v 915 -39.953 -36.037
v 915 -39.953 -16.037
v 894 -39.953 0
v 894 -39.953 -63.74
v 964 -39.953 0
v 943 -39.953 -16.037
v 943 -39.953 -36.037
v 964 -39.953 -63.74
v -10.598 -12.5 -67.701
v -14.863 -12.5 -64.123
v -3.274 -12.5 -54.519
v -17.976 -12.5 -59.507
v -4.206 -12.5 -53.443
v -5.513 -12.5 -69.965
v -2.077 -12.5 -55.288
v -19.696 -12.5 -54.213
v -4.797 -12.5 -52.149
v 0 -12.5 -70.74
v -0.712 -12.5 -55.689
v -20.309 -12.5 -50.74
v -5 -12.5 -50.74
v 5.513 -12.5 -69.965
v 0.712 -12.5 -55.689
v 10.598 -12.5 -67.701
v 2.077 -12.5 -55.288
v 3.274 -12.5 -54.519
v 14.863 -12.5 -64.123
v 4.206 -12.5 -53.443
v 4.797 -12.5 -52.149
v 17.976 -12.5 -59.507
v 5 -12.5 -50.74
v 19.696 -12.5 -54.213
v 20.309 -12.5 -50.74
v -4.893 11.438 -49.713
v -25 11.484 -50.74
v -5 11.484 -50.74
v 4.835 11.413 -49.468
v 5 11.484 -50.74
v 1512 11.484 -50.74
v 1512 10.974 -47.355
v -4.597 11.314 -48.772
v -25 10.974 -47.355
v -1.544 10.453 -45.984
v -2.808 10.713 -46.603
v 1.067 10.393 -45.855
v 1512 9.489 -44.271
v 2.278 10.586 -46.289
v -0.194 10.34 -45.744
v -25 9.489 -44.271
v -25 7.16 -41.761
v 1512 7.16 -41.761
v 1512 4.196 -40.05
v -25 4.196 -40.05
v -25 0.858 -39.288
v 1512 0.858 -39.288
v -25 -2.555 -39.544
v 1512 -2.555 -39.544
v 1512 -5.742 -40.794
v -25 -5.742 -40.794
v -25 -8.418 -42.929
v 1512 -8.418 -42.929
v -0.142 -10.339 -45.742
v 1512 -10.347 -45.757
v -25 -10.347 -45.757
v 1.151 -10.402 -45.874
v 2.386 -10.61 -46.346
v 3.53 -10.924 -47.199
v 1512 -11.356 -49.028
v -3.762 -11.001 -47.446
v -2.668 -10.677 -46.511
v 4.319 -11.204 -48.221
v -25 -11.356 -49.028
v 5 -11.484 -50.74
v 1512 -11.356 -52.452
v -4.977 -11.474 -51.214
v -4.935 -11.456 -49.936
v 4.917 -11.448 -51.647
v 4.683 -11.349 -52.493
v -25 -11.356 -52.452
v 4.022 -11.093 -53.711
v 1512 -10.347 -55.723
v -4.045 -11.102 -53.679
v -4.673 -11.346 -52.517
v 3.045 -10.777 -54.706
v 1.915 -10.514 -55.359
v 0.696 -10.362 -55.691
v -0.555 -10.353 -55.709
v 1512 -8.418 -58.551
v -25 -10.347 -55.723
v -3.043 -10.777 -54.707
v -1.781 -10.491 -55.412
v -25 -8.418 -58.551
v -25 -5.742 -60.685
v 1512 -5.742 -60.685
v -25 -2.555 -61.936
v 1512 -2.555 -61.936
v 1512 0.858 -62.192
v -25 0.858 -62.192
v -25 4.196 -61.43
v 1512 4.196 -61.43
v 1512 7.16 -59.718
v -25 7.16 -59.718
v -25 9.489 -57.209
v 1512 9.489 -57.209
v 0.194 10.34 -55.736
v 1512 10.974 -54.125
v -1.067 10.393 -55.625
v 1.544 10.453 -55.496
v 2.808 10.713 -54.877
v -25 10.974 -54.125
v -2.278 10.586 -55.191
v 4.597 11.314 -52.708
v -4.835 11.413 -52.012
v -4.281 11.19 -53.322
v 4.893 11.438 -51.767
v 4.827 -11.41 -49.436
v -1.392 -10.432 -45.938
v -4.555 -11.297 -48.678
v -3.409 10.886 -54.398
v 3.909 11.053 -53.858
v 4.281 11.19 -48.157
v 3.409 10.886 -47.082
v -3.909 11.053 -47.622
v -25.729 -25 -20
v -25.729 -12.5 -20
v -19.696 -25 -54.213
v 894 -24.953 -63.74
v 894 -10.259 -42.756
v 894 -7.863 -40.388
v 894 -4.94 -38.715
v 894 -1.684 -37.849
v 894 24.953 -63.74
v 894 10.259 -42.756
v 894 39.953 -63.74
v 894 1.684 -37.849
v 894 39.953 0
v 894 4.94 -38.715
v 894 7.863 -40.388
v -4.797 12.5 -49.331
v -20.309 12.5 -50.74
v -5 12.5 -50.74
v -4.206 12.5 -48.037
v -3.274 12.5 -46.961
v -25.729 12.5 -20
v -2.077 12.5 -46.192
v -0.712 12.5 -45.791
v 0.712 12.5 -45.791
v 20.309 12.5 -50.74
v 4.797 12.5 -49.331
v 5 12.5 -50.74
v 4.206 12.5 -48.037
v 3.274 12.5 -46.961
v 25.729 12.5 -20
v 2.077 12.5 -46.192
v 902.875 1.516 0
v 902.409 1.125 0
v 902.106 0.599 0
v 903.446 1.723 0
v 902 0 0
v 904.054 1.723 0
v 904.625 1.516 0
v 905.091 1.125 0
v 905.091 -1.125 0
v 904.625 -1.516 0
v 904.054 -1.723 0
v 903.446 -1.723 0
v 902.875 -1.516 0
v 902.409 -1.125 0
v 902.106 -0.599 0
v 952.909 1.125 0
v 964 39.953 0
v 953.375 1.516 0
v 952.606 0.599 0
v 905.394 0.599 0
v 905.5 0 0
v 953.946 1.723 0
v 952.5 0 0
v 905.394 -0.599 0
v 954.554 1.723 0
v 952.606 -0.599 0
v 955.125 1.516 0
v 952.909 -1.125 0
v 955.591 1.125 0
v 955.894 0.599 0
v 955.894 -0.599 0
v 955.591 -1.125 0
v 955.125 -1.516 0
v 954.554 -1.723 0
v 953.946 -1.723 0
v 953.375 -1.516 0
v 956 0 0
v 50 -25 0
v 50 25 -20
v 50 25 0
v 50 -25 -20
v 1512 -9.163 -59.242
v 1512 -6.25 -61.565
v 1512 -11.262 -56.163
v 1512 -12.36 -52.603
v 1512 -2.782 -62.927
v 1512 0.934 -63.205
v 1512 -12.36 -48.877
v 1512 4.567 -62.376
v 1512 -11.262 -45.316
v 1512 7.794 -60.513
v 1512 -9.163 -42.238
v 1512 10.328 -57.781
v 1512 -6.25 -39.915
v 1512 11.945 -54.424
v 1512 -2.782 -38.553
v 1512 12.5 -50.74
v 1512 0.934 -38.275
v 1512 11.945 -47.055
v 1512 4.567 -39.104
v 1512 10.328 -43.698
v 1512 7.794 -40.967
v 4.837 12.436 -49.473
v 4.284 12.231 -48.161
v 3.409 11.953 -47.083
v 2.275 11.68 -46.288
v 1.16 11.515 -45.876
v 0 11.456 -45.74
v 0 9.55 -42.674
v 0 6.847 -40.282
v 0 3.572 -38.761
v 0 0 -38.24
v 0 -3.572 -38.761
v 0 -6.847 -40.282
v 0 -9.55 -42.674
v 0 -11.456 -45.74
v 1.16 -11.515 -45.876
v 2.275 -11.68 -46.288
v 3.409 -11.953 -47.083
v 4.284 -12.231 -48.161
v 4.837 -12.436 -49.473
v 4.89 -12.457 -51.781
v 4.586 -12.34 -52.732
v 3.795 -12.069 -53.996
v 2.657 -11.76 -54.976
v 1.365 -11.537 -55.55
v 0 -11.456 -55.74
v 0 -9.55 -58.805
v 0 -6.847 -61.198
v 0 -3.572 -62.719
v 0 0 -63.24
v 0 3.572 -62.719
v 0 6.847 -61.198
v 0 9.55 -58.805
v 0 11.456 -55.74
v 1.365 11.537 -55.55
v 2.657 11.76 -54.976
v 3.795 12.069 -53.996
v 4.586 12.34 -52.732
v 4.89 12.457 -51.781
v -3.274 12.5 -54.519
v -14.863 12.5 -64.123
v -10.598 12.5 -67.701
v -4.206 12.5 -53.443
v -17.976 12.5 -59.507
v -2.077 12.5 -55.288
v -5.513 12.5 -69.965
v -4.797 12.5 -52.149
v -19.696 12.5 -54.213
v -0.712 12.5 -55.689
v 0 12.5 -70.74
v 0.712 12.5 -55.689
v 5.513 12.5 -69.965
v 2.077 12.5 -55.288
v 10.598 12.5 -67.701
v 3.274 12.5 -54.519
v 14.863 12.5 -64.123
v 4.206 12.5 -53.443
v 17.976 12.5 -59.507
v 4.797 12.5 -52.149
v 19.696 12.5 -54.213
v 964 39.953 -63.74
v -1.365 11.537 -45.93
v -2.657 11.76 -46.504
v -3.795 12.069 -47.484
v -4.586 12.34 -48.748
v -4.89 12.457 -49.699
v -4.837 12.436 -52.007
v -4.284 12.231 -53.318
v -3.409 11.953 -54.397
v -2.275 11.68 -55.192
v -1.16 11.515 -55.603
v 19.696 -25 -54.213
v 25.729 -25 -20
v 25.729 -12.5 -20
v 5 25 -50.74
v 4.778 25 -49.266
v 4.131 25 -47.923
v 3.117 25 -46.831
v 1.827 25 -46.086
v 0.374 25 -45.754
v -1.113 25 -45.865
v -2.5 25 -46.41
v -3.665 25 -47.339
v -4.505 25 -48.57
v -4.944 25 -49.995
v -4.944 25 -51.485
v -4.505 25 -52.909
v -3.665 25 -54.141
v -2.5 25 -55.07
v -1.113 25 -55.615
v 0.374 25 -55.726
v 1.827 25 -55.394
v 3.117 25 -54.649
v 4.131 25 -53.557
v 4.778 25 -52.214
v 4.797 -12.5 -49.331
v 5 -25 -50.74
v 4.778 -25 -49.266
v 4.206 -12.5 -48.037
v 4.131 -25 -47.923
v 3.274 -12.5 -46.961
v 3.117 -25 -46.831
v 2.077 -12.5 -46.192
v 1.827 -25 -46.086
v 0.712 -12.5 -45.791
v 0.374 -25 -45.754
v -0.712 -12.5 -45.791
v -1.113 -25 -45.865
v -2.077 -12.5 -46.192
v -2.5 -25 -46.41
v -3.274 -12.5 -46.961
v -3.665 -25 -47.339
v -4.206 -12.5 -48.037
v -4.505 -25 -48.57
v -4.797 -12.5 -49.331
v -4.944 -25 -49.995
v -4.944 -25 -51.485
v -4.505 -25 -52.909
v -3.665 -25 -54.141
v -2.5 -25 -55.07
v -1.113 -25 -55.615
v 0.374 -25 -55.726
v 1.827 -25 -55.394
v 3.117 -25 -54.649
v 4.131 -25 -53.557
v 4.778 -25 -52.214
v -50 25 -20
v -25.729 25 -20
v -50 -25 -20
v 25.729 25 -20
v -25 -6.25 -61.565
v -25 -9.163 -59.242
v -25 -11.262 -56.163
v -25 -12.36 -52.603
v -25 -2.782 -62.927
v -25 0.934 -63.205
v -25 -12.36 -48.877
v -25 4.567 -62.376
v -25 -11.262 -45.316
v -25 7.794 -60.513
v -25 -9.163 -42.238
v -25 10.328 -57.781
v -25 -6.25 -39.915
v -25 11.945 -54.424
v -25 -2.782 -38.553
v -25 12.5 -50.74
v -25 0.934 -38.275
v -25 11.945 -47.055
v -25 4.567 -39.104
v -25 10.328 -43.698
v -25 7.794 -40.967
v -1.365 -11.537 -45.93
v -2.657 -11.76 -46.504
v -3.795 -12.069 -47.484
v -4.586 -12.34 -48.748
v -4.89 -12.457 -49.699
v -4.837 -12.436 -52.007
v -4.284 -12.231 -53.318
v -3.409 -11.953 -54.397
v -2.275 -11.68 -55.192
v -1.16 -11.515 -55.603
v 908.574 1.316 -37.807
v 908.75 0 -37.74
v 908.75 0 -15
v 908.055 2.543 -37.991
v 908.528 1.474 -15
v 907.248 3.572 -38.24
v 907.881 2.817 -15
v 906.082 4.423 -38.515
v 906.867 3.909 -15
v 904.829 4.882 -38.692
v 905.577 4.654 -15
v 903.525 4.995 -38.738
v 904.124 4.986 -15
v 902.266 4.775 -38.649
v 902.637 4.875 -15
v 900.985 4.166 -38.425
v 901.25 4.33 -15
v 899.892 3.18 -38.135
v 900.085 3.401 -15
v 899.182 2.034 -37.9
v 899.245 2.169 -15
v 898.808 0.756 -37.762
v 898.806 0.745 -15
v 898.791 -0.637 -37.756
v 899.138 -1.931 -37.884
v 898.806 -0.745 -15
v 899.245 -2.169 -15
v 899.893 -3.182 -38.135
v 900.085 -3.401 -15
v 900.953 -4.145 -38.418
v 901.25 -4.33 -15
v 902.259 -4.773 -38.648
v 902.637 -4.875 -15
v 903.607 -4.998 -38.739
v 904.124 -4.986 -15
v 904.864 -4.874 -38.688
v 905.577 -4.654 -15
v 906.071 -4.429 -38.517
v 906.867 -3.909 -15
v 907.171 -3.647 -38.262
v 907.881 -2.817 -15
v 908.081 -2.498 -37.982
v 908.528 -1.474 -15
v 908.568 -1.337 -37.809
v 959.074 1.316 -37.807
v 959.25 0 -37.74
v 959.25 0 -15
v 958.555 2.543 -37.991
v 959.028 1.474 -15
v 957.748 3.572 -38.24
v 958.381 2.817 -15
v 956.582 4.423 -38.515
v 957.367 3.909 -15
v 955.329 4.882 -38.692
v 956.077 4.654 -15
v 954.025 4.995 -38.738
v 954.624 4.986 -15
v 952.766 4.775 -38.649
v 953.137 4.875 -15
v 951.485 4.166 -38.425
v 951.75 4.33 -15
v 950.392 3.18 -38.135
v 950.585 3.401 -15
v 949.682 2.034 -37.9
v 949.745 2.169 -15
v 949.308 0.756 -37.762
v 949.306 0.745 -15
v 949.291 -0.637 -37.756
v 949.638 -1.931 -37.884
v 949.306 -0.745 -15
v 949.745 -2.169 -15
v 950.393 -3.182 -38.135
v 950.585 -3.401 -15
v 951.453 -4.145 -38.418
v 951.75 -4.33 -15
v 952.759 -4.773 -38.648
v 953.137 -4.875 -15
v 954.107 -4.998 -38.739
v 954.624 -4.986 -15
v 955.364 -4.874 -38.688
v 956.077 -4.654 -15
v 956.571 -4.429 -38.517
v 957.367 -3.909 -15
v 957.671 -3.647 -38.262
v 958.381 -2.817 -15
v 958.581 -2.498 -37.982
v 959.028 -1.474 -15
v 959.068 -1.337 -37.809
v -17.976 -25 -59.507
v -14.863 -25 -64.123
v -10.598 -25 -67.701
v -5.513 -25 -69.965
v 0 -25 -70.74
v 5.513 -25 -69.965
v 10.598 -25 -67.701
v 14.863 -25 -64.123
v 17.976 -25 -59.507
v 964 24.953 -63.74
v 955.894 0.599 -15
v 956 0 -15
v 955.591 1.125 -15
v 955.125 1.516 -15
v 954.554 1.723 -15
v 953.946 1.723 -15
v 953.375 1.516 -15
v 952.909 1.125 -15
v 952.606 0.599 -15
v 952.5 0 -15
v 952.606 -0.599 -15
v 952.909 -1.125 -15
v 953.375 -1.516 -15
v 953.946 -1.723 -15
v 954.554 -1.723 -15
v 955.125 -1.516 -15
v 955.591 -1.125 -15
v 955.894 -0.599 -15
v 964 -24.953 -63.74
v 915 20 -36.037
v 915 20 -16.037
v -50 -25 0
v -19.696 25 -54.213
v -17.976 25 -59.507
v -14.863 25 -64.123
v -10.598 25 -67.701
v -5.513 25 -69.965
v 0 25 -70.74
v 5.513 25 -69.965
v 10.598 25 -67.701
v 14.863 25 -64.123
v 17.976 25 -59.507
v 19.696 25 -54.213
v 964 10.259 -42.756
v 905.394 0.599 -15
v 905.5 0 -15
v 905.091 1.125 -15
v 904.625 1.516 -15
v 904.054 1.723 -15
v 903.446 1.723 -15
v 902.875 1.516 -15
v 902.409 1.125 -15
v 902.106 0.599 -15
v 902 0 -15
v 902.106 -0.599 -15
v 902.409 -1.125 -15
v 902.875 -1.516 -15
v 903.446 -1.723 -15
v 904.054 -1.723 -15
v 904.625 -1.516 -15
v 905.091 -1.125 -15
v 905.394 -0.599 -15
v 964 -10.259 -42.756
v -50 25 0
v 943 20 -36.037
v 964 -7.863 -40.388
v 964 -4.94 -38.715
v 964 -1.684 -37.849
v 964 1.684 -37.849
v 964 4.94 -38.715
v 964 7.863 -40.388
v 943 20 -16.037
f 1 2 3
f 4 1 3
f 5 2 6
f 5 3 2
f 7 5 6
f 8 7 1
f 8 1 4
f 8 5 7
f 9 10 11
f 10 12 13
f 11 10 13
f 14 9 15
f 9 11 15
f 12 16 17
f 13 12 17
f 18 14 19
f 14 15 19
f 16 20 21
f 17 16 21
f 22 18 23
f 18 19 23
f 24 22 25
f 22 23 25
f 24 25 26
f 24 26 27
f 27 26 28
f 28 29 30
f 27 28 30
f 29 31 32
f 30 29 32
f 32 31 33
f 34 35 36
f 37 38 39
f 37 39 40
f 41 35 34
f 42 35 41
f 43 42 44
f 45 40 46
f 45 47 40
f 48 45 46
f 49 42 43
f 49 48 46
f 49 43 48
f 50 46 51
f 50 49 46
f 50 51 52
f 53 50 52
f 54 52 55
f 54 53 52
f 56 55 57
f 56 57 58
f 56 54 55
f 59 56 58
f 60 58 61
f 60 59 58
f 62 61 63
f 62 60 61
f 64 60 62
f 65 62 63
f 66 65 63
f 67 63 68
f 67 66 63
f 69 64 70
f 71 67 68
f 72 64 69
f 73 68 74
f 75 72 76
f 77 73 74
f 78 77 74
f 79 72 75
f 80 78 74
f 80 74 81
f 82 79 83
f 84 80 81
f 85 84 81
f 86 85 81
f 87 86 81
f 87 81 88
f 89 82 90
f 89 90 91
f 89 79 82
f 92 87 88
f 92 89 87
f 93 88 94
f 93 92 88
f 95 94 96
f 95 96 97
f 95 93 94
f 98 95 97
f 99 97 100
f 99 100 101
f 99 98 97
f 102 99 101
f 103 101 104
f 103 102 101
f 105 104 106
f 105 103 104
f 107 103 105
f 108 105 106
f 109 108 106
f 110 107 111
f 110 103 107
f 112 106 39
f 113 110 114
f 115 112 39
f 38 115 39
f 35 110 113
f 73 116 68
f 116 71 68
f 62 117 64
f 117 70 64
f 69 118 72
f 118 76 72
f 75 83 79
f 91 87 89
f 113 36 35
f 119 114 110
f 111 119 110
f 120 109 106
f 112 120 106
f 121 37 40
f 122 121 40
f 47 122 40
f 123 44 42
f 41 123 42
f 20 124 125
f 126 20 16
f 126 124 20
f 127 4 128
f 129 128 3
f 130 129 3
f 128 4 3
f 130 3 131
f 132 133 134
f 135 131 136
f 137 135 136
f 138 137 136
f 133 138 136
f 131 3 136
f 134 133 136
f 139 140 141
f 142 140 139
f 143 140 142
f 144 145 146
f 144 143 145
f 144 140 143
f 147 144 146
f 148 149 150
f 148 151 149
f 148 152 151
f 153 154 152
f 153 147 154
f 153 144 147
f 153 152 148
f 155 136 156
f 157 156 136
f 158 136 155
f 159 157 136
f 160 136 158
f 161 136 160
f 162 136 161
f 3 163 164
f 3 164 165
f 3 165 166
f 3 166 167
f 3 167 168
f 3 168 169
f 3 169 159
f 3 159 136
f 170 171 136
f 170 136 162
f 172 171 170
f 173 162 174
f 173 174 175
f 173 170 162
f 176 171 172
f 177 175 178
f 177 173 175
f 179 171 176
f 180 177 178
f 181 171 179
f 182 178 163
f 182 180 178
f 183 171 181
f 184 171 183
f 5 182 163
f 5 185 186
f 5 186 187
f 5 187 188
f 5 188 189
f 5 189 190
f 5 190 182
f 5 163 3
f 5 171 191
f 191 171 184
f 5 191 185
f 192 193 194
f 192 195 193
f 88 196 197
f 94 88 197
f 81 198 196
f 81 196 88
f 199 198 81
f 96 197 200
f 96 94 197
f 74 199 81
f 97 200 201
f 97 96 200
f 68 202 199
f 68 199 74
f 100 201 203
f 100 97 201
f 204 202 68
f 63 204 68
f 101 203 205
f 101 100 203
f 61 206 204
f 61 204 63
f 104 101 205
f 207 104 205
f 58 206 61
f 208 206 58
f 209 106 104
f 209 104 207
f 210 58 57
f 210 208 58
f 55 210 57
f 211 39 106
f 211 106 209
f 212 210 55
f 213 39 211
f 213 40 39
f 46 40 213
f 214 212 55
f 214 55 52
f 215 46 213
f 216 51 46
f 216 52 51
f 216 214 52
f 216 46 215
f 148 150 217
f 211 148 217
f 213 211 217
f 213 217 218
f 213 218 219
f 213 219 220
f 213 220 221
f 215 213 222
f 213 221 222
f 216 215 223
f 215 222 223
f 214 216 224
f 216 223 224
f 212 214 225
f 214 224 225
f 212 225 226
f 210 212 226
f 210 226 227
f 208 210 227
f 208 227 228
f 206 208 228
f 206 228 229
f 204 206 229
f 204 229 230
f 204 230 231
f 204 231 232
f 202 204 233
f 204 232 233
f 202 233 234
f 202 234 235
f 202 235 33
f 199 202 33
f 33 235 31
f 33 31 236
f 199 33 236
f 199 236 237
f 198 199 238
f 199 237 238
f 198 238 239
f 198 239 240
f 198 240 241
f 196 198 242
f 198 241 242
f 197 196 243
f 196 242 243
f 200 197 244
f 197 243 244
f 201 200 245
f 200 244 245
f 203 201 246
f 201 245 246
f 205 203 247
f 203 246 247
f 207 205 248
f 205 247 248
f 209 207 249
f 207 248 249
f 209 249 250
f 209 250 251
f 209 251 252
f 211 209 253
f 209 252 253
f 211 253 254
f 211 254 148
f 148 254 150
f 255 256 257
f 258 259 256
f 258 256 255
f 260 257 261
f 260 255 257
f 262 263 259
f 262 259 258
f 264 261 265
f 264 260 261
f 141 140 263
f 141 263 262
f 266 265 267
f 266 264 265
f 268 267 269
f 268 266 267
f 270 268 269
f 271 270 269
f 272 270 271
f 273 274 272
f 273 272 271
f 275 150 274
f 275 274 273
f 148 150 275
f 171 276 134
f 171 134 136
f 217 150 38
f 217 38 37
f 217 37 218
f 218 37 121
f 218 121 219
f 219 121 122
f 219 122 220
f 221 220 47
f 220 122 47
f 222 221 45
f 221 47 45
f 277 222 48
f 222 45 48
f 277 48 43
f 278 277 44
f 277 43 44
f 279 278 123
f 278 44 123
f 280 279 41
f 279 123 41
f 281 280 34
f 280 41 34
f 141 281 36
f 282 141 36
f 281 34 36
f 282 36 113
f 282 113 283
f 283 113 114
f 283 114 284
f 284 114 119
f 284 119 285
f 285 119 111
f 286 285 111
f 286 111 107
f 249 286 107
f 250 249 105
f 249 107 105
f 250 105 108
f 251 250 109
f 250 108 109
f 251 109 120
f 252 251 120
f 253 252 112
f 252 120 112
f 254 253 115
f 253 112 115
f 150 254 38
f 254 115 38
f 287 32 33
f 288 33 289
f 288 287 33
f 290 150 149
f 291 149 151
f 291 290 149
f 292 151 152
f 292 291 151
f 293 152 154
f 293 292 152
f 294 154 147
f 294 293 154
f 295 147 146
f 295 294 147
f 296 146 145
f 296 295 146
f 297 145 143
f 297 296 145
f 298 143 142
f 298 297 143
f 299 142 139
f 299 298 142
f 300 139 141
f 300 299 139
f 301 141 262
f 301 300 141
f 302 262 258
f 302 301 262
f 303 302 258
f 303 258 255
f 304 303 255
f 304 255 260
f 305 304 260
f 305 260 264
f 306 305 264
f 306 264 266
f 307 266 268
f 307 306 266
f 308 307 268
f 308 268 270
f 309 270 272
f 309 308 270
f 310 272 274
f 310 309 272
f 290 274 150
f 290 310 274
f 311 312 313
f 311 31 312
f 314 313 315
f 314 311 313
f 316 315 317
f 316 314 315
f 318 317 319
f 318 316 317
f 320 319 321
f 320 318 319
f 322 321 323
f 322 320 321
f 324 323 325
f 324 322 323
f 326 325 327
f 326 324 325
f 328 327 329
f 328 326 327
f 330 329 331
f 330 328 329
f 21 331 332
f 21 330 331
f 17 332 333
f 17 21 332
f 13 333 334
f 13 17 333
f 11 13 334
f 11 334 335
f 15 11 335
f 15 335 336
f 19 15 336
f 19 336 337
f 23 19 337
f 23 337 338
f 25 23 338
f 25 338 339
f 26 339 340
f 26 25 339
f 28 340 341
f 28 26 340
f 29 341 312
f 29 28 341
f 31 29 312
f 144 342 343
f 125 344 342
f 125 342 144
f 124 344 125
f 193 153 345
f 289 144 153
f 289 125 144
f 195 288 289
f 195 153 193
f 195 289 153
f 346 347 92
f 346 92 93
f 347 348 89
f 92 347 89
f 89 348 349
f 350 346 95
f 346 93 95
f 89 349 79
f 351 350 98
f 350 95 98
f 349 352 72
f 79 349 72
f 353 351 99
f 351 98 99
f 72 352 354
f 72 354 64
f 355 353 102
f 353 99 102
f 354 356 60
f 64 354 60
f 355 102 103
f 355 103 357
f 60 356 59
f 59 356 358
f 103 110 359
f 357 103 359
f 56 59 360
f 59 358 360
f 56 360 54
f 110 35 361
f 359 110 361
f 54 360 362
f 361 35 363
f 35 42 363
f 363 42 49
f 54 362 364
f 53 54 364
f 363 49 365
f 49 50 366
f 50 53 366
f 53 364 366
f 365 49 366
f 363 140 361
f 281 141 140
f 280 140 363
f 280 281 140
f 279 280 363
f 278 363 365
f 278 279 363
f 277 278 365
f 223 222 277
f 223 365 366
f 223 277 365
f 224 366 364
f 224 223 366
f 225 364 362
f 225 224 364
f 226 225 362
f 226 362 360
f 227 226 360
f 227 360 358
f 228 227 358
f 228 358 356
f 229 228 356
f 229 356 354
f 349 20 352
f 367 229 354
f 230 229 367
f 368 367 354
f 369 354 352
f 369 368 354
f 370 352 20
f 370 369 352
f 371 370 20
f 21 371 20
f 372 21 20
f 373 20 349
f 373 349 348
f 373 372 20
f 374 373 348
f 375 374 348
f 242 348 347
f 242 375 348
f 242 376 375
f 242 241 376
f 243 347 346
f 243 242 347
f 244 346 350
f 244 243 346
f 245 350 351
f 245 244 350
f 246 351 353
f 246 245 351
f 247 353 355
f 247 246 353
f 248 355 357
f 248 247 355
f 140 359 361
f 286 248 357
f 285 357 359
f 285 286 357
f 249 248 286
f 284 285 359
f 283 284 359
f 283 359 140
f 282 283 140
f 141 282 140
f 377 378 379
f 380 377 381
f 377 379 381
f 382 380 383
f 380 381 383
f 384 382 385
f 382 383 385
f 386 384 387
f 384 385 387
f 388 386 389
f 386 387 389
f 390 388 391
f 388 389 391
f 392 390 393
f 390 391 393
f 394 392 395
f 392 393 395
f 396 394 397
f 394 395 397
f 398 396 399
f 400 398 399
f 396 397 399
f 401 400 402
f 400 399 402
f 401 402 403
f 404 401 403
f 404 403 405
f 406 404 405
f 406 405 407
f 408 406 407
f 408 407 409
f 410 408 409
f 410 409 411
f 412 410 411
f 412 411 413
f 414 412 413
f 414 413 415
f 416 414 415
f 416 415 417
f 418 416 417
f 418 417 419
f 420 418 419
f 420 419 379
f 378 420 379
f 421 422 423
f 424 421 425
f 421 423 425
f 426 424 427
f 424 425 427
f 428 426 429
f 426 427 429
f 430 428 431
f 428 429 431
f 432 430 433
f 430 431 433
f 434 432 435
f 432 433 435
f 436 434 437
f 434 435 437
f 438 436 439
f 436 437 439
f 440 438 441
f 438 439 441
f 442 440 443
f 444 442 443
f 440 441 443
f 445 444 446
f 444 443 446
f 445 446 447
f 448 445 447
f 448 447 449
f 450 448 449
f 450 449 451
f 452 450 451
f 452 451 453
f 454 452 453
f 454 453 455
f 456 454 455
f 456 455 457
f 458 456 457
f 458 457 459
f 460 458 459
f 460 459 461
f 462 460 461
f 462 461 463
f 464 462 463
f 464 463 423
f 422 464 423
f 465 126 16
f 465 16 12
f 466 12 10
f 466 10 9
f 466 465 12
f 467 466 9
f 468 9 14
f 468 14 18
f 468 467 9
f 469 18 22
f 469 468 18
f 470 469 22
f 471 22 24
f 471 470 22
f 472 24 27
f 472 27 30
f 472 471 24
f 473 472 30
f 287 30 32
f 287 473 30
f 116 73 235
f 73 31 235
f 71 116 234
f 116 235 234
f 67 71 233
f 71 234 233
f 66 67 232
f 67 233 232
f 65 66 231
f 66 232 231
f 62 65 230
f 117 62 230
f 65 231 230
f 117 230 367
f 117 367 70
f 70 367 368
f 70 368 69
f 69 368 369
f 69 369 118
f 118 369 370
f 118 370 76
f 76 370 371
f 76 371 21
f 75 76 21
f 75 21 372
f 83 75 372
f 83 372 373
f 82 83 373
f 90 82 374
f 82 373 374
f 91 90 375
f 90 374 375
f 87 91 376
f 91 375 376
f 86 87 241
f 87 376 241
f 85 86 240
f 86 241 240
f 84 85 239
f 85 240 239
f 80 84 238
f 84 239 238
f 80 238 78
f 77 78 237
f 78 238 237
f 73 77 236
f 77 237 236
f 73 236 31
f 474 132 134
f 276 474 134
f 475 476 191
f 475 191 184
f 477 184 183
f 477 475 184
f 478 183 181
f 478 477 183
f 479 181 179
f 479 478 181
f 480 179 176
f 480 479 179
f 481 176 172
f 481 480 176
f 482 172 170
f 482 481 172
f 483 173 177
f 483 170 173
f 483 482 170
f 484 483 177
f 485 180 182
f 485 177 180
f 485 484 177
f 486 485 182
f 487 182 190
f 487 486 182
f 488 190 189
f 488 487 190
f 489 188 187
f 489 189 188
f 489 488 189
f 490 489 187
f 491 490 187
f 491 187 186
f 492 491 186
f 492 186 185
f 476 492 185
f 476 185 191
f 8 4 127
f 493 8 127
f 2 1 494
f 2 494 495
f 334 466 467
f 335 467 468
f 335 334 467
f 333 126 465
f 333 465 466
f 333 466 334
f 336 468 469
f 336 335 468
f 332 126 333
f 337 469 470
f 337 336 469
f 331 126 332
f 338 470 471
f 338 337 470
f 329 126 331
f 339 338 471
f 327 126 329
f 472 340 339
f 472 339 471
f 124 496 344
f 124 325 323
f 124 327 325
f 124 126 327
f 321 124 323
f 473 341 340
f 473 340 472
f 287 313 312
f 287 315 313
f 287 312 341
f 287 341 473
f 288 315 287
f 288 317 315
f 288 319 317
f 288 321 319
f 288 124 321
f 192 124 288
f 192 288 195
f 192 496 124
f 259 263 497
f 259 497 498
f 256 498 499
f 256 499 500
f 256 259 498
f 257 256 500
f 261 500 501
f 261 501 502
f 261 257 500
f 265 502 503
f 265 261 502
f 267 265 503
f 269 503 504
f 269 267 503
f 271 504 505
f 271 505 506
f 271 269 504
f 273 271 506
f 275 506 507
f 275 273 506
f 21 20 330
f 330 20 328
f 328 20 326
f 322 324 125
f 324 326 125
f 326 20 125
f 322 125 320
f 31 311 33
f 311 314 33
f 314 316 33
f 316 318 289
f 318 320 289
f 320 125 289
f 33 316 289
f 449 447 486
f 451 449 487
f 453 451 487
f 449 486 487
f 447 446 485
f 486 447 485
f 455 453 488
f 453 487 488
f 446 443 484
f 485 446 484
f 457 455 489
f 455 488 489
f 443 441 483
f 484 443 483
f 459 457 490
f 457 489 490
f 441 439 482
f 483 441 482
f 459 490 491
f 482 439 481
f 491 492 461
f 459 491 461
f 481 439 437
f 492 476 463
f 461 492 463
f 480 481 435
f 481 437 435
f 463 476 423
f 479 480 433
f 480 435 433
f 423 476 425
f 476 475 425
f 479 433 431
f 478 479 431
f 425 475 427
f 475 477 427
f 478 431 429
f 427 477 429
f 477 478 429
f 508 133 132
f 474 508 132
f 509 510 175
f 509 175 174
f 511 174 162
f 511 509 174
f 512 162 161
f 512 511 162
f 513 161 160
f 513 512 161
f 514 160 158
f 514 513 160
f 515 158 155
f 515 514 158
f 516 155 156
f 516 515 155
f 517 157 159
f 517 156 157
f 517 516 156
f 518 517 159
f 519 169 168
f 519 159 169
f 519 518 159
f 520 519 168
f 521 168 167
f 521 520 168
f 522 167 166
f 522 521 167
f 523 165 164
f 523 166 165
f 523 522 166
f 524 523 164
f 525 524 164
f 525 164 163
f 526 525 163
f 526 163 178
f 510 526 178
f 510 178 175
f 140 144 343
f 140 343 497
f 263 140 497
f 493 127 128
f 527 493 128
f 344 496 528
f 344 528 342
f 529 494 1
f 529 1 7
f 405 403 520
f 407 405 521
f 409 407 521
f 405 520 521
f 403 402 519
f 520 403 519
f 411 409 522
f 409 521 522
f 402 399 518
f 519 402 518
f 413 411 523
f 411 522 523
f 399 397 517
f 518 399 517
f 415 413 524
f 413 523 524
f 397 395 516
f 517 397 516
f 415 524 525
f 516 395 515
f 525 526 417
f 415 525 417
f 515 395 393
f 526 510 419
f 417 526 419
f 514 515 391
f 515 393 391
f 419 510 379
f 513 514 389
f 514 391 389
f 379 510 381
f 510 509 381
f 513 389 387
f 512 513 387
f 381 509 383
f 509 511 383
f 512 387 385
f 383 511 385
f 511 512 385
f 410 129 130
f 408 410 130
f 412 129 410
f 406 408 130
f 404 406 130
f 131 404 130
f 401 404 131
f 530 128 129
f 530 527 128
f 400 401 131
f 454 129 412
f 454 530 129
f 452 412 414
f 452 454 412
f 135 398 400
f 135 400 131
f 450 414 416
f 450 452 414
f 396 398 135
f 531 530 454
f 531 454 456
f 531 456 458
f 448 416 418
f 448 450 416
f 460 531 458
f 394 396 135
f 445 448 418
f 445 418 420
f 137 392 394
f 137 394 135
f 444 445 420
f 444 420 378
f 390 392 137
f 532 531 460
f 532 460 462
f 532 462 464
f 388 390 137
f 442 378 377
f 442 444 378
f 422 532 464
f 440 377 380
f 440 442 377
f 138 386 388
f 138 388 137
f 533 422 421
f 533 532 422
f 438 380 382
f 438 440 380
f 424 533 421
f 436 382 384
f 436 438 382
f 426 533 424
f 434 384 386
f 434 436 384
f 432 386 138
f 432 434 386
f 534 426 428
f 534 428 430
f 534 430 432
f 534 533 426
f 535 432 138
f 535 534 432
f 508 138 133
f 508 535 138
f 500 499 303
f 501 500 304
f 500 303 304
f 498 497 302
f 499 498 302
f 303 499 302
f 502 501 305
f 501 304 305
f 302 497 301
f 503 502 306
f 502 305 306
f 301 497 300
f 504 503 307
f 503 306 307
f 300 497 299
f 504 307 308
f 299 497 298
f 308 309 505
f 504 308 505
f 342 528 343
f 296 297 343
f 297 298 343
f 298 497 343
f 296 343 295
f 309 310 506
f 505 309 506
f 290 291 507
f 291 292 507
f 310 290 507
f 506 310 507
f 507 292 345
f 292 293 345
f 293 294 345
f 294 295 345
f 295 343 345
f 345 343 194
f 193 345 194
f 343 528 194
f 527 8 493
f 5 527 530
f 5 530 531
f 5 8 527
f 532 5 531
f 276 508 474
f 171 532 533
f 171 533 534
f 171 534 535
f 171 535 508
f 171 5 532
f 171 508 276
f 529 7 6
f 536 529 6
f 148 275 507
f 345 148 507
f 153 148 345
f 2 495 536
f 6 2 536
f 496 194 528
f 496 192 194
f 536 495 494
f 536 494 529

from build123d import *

# Parameters (mm, degrees)
F0_R           = 5
F1_DEPTH       = 25
F2_DEPTH       = 12.5
F3_R           = 12.5
F3_R_2         = 11.484
F4_DEPTH       = 25
F4_DEPTH_BACK  = 1512
F5_DEPTH       = 31.3
F8_DEPTH       = 35
F10_R          = 5
F10_R_2        = 1.75
F11_DEPTH      = 61
F12_DEPTH      = 15.001
F13_W          = 28
F13_H          = 20
F14_DEPTH      = 20
F14_DEPTH_BACK = 39.9535567697


with BuildPart() as f1:
    # F0 (on Front) → F1 (new body, symmetric)
    with BuildSketch(Plane.XZ):
        Polygon((50, 0), (-50, 0), (-50, -20), (-25.728808637, -20), (25.728808637, -20), (50, -20), align=None)
        with BuildLine():
            Line((25.728808637, -20), (-25.728808637, -20))
            Line((-25.728808637, -20), (-19.6961550602, -54.2128785537))
            ThreePointArc((-19.6961550602, -54.2128785537), (0, -70.7399150003), (19.6961550602, -54.2128785537))
            Line((19.6961550602, -54.2128785537), (25.728808637, -20))
        make_face()
        with Locations((0, -50.7399150003)):
            Circle(F0_R, mode=Mode.SUBTRACT)
    extrude(amount=F1_DEPTH, both=True)

    # F0 (on Front) → F2 (cut, symmetric)
    with BuildSketch(Plane.XZ):
        with BuildLine():
            Line((25.728808637, -20), (-25.728808637, -20))
            Line((-25.728808637, -20), (-19.6961550602, -54.2128785537))
            ThreePointArc((-19.6961550602, -54.2128785537), (0, -70.7399150003), (19.6961550602, -54.2128785537))
            Line((19.6961550602, -54.2128785537), (25.728808637, -20))
        make_face()
        with Locations((0, -50.7399150003)):
            Circle(F0_R, mode=Mode.SUBTRACT)
    extrude(amount=F2_DEPTH, both=True, mode=Mode.SUBTRACT)

    # F3 (on Right) → F4 (join, two sides)
    with BuildSketch(Plane.YZ) as f4_sk:
        with Locations((0, -50.7399150003)):
            Circle(F3_R)
        with Locations((0, -50.7399150003)):
            Circle(F3_R_2, mode=Mode.SUBTRACT)
    extrude(amount=-F4_DEPTH)
    extrude(f4_sk.sketch, amount=F4_DEPTH_BACK)

    # F0 (on Front) → F5 (cut, symmetric)
    with BuildSketch(Plane.XZ):
        with Locations((0, -50.7399150003)):
            Circle(F0_R)
    extrude(amount=F5_DEPTH, both=True, mode=Mode.SUBTRACT)


with BuildPart() as f8:
    # F7 (on offset) → F8 (new body, symmetric)
    with BuildSketch(Plane.YZ.offset(929)):
        with BuildLine():
            ThreePointArc((-10.2592185517, -42.7556533119), (0, -37.7399150003), (10.2592185517, -42.7556533119))
            Line((10.2592185517, -42.7556533119), (24.9525567697, -63.7399150003))
            Line((24.9525567697, -63.7399150003), (39.9525567697, -63.7399150003))
            Line((39.9525567697, -63.7399150003), (39.9525567697, 0))
            Line((39.9525567697, 0), (-39.9525567697, 0))
            Line((-39.9525567697, 0), (-39.9525567697, -63.7399150003))
            Line((-39.9525567697, -63.7399150003), (-24.9525567697, -63.7399150003))
            Line((-24.9525567697, -63.7399150003), (-10.2592185517, -42.7556533119))
        make_face()
    extrude(amount=F8_DEPTH, both=True)

    # F10 (on offset) → F11 (cut)
    with BuildSketch(Plane.XY.offset(-15)):
        with Locations((903.75, 0)):
            Circle(F10_R)
        with Locations((903.75, 0)):
            Circle(F10_R_2, mode=Mode.SUBTRACT)
        with Locations((954.25, 0)):
            Circle(F10_R)
        with Locations((954.25, 0)):
            Circle(F10_R_2, mode=Mode.SUBTRACT)
        with Locations((903.75, 0)):
            Circle(F10_R_2)
        with Locations((954.25, 0)):
            Circle(F10_R_2)
    extrude(amount=-F11_DEPTH, mode=Mode.SUBTRACT)

    # F10 (on offset) → F12 (cut, through all)
    with BuildSketch(Plane.XY.offset(-15)):
        with Locations((903.75, 0)):
            Circle(F10_R_2)
        with Locations((954.25, 0)):
            Circle(F10_R_2)
    extrude(amount=F12_DEPTH, mode=Mode.SUBTRACT)

    # F13 (on Front) → F14 (cut, two sides)
    with BuildSketch(Plane.XZ) as f14_sk:
        with Locations((929, -26.0371023417)):
            Rectangle(F13_W, F13_H)
    extrude(amount=-F14_DEPTH, mode=Mode.SUBTRACT)
    extrude(f14_sk.sketch, amount=F14_DEPTH_BACK, mode=Mode.SUBTRACT)


solid = Compound([f1.part, f8.part])
